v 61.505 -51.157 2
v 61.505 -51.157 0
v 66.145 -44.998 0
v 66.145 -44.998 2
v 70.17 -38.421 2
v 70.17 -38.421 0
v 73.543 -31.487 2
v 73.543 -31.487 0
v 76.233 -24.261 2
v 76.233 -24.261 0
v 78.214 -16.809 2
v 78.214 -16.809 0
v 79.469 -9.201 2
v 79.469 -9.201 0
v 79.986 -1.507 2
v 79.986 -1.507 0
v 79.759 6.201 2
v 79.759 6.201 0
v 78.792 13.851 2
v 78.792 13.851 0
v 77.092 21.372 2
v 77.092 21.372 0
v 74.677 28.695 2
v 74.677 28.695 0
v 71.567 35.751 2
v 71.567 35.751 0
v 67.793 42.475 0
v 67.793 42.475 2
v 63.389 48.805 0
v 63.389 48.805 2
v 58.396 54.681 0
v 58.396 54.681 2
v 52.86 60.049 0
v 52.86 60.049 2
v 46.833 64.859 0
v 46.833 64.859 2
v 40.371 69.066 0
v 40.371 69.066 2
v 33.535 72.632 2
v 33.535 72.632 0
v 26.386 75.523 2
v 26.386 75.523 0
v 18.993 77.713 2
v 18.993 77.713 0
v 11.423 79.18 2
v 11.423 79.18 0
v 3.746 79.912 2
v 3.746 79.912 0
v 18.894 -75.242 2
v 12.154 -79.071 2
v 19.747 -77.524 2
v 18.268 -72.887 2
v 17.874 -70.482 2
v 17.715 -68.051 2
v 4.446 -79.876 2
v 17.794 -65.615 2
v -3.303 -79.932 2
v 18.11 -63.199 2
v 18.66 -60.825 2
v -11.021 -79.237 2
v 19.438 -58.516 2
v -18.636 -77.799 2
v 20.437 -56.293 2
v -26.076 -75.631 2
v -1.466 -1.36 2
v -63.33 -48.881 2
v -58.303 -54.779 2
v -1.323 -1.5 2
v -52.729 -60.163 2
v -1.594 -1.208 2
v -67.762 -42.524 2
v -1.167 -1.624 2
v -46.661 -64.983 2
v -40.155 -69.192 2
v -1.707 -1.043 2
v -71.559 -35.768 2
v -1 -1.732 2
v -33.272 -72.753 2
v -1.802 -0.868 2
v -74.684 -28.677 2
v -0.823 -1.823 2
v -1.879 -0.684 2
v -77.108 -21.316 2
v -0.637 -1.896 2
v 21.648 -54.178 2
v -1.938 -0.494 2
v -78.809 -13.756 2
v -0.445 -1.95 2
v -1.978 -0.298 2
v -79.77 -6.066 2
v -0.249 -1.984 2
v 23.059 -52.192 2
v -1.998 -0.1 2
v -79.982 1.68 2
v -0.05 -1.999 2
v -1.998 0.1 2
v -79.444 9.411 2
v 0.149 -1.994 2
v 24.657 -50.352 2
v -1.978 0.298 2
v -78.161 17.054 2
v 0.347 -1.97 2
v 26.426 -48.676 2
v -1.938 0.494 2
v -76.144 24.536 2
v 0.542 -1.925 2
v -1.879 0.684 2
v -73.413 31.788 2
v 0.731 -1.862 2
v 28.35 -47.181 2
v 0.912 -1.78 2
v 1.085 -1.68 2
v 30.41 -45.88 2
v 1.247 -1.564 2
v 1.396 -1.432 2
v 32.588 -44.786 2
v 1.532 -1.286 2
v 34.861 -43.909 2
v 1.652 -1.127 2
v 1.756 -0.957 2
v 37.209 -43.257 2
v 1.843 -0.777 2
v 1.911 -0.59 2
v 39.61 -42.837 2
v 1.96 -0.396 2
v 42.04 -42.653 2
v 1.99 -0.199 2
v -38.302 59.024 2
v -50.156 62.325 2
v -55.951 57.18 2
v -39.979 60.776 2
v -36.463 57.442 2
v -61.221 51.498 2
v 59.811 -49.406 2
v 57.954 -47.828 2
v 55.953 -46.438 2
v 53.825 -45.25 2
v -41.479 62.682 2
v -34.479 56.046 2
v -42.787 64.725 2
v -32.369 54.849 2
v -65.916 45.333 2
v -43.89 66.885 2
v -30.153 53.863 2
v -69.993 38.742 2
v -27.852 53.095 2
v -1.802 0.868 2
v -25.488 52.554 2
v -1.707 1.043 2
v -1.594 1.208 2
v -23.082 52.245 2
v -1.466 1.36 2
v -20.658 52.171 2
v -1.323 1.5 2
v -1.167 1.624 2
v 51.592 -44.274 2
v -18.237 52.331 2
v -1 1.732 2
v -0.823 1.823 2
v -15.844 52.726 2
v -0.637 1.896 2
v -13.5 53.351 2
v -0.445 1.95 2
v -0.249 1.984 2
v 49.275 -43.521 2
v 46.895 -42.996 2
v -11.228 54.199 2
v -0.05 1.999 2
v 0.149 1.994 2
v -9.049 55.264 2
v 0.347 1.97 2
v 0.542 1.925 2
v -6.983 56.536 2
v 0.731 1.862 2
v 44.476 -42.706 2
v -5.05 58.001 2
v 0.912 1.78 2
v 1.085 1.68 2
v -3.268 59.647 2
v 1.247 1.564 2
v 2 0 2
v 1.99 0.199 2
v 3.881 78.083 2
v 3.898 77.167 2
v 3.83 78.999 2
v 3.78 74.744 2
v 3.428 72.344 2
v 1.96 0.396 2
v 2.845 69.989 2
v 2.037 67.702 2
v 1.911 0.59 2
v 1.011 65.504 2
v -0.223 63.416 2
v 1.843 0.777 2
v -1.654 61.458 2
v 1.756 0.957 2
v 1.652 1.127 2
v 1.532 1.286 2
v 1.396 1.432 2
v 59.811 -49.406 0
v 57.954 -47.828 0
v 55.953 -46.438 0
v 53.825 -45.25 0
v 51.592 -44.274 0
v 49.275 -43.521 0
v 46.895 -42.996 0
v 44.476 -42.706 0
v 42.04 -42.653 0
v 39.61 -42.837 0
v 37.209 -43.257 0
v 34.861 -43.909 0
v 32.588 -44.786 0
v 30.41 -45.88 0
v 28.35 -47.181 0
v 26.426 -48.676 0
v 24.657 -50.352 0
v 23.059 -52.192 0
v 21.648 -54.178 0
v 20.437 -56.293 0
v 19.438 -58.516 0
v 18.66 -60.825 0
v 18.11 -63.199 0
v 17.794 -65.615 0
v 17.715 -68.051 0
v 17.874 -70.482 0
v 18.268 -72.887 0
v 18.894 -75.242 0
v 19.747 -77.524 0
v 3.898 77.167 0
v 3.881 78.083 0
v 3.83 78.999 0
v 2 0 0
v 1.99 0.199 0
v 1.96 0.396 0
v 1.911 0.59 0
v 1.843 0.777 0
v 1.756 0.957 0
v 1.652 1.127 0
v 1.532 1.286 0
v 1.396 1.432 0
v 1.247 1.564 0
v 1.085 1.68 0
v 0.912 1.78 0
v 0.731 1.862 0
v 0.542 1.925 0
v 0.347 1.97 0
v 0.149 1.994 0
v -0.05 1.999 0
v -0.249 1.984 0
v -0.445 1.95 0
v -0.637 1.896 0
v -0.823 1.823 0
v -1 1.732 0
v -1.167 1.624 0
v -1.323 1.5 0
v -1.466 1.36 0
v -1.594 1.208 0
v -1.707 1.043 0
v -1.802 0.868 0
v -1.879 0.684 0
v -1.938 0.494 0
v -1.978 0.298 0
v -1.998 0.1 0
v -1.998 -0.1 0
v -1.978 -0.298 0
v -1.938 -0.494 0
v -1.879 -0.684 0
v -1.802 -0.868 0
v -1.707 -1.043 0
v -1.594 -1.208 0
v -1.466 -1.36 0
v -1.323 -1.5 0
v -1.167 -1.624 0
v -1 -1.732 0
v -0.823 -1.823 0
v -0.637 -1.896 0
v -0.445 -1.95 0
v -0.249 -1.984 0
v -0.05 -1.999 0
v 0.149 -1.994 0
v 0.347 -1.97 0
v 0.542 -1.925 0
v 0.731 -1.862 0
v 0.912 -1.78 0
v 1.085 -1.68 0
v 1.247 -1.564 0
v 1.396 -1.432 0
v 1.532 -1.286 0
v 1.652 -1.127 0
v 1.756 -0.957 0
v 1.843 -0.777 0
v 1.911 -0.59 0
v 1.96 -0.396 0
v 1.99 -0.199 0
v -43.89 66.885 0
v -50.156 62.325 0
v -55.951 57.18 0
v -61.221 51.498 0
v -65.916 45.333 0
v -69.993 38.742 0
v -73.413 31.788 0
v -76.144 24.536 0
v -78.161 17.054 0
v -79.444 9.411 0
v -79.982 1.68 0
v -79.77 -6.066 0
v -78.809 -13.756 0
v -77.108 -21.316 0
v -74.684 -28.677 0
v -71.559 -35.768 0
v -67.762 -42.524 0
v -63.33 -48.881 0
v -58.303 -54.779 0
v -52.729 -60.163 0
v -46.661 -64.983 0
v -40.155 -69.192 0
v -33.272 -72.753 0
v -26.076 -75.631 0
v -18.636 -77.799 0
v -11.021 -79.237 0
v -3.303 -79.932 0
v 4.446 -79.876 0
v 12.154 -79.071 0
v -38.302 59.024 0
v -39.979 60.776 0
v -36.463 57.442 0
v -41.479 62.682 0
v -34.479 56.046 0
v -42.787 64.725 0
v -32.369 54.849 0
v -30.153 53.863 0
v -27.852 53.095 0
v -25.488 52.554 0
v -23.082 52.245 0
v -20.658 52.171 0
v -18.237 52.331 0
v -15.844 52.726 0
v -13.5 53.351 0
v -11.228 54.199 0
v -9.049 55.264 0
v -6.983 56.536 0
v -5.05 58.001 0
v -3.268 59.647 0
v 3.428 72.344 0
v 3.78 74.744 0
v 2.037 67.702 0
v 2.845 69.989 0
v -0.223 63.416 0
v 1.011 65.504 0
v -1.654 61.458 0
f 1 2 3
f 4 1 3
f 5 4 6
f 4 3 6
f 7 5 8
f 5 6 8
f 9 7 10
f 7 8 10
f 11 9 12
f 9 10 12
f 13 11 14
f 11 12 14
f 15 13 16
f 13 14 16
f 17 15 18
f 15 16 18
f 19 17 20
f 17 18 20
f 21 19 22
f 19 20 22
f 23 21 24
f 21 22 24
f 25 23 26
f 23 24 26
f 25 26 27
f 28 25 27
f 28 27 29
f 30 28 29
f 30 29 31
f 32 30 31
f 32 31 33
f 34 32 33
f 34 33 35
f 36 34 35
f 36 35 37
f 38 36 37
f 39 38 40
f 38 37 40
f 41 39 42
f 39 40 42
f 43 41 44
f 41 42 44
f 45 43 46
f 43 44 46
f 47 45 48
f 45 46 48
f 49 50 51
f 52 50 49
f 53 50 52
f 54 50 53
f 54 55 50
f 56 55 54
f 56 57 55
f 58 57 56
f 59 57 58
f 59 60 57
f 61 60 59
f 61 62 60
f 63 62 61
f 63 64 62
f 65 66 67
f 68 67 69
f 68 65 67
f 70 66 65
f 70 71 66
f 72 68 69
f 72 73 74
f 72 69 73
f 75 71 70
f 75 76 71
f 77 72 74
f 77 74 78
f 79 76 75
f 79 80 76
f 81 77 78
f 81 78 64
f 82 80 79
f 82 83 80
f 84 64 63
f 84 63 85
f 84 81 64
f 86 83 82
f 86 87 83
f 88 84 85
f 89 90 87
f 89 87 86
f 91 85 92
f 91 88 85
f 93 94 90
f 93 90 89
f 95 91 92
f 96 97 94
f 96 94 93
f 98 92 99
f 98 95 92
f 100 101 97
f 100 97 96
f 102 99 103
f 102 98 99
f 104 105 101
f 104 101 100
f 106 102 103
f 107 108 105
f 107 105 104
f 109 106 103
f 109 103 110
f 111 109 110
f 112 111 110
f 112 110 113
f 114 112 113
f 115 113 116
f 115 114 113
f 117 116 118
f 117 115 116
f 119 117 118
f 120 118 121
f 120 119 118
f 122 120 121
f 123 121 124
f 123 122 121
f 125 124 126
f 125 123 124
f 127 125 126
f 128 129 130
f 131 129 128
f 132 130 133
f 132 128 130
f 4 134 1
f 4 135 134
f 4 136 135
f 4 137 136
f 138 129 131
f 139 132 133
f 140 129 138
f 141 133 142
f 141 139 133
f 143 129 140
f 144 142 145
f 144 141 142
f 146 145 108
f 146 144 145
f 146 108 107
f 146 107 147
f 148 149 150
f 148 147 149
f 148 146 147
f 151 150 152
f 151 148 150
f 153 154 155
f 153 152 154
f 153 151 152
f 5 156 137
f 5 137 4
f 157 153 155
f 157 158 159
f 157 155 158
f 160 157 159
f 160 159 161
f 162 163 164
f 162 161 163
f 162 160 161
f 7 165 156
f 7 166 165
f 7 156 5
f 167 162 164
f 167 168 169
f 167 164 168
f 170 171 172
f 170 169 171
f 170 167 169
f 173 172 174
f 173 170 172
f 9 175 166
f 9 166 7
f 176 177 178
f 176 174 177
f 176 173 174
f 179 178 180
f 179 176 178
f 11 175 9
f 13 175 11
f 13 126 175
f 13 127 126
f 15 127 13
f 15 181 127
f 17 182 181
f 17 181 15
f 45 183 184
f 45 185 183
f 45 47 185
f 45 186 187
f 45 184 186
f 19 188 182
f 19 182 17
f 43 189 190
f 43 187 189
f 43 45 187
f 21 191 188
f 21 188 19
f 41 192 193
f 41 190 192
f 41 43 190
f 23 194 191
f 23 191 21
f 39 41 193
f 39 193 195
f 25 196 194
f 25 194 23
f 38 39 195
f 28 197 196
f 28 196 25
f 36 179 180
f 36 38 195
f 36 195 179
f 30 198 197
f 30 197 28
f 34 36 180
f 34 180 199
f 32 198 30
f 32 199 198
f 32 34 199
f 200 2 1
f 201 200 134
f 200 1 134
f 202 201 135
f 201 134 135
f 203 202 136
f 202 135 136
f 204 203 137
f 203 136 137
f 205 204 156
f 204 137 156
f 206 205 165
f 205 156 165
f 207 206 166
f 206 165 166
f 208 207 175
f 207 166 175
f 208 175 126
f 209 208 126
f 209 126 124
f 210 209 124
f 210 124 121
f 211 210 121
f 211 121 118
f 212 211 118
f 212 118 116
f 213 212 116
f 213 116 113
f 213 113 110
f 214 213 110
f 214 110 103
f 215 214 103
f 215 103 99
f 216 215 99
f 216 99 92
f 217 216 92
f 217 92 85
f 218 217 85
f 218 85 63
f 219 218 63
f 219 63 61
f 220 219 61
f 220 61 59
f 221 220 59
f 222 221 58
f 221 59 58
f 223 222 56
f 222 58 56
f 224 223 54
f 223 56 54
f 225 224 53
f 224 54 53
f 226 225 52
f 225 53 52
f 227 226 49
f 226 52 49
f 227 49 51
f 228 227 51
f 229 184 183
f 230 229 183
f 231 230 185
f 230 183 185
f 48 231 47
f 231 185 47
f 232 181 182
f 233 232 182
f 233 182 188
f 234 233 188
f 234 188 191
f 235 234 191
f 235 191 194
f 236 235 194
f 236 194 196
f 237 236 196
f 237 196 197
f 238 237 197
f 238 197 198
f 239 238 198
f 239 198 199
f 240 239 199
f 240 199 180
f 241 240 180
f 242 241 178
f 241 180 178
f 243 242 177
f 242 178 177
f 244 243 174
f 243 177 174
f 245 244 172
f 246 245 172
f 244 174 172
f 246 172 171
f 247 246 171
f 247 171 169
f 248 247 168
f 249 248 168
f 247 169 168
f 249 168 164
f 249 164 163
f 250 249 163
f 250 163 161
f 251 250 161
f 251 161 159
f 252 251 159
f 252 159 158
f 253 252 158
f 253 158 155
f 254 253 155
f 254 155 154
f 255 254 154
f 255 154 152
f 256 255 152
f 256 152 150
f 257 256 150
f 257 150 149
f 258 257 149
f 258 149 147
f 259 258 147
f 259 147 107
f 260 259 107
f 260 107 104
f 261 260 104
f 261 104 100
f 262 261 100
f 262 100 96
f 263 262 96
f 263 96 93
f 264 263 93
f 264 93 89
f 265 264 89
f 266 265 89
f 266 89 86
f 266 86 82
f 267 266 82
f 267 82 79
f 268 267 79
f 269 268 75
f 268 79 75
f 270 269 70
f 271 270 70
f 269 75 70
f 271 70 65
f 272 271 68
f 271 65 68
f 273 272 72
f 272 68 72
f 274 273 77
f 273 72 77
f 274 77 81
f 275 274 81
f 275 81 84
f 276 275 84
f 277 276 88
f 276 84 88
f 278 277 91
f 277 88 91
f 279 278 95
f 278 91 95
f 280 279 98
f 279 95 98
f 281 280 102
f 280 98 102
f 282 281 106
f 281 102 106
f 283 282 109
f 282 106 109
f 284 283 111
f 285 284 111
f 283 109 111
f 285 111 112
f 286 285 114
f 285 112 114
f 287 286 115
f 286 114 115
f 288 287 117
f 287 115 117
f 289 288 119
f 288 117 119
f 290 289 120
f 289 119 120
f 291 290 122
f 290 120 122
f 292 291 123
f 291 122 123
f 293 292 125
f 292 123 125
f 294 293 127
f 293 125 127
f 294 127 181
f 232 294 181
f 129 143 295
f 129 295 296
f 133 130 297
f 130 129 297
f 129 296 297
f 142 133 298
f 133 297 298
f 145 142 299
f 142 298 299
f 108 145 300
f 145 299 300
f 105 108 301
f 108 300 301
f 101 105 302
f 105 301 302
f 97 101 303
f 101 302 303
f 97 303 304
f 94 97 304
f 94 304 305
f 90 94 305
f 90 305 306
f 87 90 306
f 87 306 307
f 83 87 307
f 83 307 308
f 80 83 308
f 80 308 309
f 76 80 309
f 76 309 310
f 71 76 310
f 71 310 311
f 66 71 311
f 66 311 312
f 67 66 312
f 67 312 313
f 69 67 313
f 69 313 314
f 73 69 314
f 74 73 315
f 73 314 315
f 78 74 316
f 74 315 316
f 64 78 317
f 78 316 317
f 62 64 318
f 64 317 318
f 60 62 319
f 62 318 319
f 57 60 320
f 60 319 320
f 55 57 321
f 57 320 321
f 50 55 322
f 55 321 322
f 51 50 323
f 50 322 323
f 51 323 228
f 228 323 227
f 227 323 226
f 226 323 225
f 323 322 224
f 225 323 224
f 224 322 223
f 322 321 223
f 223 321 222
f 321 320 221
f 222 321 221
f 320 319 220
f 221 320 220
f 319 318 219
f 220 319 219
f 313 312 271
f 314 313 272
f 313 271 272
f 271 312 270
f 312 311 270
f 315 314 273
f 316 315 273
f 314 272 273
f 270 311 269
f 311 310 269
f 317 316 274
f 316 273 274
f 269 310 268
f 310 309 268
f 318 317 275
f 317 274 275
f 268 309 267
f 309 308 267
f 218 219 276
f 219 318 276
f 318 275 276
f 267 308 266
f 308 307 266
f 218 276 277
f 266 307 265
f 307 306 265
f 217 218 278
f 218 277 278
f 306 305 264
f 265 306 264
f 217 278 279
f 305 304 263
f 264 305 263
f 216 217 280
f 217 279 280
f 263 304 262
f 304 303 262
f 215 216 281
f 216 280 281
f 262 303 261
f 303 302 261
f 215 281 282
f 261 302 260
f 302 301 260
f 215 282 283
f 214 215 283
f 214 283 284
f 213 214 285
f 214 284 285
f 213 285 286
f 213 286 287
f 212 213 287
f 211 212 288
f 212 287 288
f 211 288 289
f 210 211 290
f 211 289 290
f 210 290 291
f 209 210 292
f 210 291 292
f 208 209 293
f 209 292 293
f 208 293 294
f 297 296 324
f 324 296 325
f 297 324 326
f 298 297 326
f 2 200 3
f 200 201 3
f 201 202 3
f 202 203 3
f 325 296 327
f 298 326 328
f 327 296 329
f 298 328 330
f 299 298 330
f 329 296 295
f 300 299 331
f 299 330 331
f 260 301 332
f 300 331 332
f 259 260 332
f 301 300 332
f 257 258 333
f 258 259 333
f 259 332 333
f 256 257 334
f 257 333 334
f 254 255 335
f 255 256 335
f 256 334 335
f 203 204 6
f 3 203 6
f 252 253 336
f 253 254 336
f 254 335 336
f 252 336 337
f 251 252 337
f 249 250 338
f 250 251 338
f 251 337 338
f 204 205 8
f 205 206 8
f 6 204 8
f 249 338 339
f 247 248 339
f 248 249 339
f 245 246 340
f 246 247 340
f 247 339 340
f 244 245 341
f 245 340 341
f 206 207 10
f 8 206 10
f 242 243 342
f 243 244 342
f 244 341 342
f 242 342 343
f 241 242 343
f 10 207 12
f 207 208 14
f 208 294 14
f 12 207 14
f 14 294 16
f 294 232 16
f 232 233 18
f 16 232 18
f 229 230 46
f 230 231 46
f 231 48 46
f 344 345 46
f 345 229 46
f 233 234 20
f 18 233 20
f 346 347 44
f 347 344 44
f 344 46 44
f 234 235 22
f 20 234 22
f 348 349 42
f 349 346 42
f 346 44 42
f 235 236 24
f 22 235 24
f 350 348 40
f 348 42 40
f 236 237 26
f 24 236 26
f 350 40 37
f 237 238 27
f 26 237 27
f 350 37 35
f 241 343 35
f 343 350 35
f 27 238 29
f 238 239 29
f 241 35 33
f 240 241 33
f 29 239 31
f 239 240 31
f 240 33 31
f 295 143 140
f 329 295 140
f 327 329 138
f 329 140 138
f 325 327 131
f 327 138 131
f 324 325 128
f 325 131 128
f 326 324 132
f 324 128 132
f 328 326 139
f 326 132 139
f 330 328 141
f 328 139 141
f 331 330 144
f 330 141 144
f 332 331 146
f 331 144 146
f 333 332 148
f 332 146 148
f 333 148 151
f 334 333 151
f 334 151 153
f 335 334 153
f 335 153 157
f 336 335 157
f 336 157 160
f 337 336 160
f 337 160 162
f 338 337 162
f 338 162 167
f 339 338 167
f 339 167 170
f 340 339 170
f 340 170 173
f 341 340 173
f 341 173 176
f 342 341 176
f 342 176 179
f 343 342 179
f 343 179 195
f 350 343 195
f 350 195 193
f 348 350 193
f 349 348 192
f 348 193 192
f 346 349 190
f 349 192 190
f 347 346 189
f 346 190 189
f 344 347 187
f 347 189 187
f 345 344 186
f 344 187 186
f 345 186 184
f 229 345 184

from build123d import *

# Parameters (mm, degrees)
F0_R     = 80
F1_DEPTH = 2
F2_R     = 25
F3_DEPTH = 25.4
F4_R     = 2
F5_DEPTH = 25.4
F7_DEPTH = 25.4


with BuildPart() as f1:
    # F0 (on Top) → F1 (new body)
    with BuildSketch(Plane.XY):
        Circle(F0_R)
    extrude(amount=F1_DEPTH)

    # F2 (on face) → F3 (cut)
    with BuildSketch(Plane.XY.offset(2)):
        with Locations((42.711879087, -67.6438865298)):
            Circle(F2_R)
    extrude(amount=-F3_DEPTH, mode=Mode.SUBTRACT)

    # F4 (on face) → F5 (cut)
    with BuildSketch(Plane.XY.offset(2)):
        Circle(F4_R)
    extrude(amount=-F5_DEPTH, mode=Mode.SUBTRACT)

    # F6 (on face) → F7 (cut)
    with BuildSketch(Plane.XY.offset(2)):
        with BuildLine():
            ThreePointArc((-43.8903481832, 66.8852549996), (-15.8440218297, 52.7258990739), (3.8976538135, 77.166644254))
            ThreePointArc((3.8976538135, 77.166644254), (3.8598196829, 78.5415170144), (3.7464318049, 79.9122284055))
            ThreePointArc((3.7464318049, 79.9122284055), (-21.1023461865, 77.166644254), (-43.8903481832, 66.8852549996))
        make_face()
        with BuildLine():
            ThreePointArc((-43.8903481832, 66.8852549996), (-21.1023461865, 77.166644254), (3.7464318049, 79.9122284055))
            ThreePointArc((3.7464318049, 79.9122284055), (-27.6968293698, 101.2812205834), (-43.8903481832, 66.8852549996))
        make_face()
    extrude(amount=-F7_DEPTH, mode=Mode.SUBTRACT)


solid = f1.part
